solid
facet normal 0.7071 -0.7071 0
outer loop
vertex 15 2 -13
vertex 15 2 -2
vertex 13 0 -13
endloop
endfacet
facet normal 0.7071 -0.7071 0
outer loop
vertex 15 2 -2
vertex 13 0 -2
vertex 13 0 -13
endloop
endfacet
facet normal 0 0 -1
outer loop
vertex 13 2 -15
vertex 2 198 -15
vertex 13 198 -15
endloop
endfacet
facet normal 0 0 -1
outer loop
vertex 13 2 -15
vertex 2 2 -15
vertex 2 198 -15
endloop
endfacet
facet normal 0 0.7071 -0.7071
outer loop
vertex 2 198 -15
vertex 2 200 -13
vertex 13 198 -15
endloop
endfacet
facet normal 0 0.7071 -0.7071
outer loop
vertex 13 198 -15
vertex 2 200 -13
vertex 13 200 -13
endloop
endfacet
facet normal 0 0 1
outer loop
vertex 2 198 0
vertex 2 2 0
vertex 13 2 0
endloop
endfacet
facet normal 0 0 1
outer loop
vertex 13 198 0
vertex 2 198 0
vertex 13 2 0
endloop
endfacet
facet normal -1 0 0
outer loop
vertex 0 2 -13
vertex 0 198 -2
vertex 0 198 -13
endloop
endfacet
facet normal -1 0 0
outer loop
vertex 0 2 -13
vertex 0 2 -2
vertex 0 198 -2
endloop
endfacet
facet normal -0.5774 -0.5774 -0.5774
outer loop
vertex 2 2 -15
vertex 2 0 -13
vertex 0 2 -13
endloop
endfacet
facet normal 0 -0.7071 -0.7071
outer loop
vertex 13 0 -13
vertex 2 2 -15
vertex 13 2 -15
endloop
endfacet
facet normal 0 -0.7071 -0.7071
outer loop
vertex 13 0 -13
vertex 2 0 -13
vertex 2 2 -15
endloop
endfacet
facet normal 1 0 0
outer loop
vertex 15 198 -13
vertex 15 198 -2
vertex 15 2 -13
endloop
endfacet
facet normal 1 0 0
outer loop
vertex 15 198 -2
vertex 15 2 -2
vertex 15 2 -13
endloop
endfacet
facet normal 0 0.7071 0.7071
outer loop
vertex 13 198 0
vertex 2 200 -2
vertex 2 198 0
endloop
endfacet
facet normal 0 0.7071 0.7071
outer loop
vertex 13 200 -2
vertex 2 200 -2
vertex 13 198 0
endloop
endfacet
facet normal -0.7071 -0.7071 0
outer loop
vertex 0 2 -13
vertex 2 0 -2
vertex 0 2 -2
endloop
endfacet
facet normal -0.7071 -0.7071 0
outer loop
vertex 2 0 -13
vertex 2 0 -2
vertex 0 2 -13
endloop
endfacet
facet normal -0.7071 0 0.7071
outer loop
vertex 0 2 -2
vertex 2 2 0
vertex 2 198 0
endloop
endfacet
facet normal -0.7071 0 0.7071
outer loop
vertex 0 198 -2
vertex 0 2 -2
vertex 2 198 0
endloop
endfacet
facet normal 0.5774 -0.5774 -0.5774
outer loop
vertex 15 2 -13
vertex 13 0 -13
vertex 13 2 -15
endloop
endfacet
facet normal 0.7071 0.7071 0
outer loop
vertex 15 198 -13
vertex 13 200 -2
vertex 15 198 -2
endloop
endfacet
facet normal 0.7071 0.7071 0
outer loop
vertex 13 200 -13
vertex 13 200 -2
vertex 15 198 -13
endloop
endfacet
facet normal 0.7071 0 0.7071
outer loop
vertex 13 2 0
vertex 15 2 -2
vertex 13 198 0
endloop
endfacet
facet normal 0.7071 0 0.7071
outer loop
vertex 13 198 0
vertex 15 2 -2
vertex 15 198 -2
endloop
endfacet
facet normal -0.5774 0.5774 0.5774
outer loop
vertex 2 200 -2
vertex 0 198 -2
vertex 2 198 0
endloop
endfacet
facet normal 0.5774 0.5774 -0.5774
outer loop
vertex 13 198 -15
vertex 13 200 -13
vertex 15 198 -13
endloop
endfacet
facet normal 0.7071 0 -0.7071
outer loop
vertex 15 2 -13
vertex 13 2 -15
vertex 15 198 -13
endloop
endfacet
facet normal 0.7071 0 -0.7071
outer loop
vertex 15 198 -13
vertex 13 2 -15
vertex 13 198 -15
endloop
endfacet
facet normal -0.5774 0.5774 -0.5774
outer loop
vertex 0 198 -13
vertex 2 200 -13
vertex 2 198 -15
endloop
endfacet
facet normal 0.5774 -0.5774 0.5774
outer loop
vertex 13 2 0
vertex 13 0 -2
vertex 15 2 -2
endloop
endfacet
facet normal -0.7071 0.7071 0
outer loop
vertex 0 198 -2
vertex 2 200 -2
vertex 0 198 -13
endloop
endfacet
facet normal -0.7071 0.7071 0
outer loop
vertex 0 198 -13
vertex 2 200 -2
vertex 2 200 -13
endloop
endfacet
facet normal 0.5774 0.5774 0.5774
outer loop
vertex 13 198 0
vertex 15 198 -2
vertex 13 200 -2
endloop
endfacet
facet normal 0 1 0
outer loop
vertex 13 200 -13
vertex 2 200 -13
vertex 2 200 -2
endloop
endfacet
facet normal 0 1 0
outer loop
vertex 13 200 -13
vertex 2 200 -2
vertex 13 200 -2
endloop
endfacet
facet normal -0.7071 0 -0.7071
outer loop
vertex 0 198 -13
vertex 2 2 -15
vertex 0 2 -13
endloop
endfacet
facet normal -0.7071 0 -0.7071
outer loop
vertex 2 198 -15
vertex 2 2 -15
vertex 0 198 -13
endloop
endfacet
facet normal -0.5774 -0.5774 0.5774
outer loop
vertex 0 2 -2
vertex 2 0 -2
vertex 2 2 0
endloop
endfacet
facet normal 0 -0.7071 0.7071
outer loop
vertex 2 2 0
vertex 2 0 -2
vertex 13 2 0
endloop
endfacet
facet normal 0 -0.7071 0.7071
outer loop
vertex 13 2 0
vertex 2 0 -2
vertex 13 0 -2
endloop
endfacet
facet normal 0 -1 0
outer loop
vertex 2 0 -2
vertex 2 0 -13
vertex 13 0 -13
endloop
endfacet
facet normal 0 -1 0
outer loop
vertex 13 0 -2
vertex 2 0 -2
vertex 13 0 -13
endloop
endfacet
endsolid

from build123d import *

# Parameters (mm, degrees)
SKETCH1_W           = 15
SKETCH1_H           = 15
BOSS_EXTRUDE1_DEPTH = 200
CHAMFER1_SIZE       = 2


with BuildPart() as part:
    # Sketch1 → Boss-Extrude1 (new body)
    with BuildSketch(Plane(origin=(0, 0, 0), x_dir=(1, 0, 0), z_dir=(0, 1, 0))):
        with Locations((7.5, 7.5)):
            Rectangle(SKETCH1_W, SKETCH1_H)
    extrude(amount=BOSS_EXTRUDE1_DEPTH)

    # Chamfer1
    chamfer1_edges = [part.edges().sort_by_distance(p)[0] for p in [
        (15, 200, -7.5),
        (7.5, 200, -15),
        (0, 200, -7.5),
        (7.5, 0, -15),
        (15, 0, -7.5),
        (7.5, 0, 0),
        (0, 0, -7.5),
        (0, 100, -15),
        (15, 100, -15),
        (15, 100, 0),
        (0, 100, 0),
        (7.5, 200, 0),
    ]]
    chamfer(chamfer1_edges, length=CHAMFER1_SIZE)


solid = part.part
